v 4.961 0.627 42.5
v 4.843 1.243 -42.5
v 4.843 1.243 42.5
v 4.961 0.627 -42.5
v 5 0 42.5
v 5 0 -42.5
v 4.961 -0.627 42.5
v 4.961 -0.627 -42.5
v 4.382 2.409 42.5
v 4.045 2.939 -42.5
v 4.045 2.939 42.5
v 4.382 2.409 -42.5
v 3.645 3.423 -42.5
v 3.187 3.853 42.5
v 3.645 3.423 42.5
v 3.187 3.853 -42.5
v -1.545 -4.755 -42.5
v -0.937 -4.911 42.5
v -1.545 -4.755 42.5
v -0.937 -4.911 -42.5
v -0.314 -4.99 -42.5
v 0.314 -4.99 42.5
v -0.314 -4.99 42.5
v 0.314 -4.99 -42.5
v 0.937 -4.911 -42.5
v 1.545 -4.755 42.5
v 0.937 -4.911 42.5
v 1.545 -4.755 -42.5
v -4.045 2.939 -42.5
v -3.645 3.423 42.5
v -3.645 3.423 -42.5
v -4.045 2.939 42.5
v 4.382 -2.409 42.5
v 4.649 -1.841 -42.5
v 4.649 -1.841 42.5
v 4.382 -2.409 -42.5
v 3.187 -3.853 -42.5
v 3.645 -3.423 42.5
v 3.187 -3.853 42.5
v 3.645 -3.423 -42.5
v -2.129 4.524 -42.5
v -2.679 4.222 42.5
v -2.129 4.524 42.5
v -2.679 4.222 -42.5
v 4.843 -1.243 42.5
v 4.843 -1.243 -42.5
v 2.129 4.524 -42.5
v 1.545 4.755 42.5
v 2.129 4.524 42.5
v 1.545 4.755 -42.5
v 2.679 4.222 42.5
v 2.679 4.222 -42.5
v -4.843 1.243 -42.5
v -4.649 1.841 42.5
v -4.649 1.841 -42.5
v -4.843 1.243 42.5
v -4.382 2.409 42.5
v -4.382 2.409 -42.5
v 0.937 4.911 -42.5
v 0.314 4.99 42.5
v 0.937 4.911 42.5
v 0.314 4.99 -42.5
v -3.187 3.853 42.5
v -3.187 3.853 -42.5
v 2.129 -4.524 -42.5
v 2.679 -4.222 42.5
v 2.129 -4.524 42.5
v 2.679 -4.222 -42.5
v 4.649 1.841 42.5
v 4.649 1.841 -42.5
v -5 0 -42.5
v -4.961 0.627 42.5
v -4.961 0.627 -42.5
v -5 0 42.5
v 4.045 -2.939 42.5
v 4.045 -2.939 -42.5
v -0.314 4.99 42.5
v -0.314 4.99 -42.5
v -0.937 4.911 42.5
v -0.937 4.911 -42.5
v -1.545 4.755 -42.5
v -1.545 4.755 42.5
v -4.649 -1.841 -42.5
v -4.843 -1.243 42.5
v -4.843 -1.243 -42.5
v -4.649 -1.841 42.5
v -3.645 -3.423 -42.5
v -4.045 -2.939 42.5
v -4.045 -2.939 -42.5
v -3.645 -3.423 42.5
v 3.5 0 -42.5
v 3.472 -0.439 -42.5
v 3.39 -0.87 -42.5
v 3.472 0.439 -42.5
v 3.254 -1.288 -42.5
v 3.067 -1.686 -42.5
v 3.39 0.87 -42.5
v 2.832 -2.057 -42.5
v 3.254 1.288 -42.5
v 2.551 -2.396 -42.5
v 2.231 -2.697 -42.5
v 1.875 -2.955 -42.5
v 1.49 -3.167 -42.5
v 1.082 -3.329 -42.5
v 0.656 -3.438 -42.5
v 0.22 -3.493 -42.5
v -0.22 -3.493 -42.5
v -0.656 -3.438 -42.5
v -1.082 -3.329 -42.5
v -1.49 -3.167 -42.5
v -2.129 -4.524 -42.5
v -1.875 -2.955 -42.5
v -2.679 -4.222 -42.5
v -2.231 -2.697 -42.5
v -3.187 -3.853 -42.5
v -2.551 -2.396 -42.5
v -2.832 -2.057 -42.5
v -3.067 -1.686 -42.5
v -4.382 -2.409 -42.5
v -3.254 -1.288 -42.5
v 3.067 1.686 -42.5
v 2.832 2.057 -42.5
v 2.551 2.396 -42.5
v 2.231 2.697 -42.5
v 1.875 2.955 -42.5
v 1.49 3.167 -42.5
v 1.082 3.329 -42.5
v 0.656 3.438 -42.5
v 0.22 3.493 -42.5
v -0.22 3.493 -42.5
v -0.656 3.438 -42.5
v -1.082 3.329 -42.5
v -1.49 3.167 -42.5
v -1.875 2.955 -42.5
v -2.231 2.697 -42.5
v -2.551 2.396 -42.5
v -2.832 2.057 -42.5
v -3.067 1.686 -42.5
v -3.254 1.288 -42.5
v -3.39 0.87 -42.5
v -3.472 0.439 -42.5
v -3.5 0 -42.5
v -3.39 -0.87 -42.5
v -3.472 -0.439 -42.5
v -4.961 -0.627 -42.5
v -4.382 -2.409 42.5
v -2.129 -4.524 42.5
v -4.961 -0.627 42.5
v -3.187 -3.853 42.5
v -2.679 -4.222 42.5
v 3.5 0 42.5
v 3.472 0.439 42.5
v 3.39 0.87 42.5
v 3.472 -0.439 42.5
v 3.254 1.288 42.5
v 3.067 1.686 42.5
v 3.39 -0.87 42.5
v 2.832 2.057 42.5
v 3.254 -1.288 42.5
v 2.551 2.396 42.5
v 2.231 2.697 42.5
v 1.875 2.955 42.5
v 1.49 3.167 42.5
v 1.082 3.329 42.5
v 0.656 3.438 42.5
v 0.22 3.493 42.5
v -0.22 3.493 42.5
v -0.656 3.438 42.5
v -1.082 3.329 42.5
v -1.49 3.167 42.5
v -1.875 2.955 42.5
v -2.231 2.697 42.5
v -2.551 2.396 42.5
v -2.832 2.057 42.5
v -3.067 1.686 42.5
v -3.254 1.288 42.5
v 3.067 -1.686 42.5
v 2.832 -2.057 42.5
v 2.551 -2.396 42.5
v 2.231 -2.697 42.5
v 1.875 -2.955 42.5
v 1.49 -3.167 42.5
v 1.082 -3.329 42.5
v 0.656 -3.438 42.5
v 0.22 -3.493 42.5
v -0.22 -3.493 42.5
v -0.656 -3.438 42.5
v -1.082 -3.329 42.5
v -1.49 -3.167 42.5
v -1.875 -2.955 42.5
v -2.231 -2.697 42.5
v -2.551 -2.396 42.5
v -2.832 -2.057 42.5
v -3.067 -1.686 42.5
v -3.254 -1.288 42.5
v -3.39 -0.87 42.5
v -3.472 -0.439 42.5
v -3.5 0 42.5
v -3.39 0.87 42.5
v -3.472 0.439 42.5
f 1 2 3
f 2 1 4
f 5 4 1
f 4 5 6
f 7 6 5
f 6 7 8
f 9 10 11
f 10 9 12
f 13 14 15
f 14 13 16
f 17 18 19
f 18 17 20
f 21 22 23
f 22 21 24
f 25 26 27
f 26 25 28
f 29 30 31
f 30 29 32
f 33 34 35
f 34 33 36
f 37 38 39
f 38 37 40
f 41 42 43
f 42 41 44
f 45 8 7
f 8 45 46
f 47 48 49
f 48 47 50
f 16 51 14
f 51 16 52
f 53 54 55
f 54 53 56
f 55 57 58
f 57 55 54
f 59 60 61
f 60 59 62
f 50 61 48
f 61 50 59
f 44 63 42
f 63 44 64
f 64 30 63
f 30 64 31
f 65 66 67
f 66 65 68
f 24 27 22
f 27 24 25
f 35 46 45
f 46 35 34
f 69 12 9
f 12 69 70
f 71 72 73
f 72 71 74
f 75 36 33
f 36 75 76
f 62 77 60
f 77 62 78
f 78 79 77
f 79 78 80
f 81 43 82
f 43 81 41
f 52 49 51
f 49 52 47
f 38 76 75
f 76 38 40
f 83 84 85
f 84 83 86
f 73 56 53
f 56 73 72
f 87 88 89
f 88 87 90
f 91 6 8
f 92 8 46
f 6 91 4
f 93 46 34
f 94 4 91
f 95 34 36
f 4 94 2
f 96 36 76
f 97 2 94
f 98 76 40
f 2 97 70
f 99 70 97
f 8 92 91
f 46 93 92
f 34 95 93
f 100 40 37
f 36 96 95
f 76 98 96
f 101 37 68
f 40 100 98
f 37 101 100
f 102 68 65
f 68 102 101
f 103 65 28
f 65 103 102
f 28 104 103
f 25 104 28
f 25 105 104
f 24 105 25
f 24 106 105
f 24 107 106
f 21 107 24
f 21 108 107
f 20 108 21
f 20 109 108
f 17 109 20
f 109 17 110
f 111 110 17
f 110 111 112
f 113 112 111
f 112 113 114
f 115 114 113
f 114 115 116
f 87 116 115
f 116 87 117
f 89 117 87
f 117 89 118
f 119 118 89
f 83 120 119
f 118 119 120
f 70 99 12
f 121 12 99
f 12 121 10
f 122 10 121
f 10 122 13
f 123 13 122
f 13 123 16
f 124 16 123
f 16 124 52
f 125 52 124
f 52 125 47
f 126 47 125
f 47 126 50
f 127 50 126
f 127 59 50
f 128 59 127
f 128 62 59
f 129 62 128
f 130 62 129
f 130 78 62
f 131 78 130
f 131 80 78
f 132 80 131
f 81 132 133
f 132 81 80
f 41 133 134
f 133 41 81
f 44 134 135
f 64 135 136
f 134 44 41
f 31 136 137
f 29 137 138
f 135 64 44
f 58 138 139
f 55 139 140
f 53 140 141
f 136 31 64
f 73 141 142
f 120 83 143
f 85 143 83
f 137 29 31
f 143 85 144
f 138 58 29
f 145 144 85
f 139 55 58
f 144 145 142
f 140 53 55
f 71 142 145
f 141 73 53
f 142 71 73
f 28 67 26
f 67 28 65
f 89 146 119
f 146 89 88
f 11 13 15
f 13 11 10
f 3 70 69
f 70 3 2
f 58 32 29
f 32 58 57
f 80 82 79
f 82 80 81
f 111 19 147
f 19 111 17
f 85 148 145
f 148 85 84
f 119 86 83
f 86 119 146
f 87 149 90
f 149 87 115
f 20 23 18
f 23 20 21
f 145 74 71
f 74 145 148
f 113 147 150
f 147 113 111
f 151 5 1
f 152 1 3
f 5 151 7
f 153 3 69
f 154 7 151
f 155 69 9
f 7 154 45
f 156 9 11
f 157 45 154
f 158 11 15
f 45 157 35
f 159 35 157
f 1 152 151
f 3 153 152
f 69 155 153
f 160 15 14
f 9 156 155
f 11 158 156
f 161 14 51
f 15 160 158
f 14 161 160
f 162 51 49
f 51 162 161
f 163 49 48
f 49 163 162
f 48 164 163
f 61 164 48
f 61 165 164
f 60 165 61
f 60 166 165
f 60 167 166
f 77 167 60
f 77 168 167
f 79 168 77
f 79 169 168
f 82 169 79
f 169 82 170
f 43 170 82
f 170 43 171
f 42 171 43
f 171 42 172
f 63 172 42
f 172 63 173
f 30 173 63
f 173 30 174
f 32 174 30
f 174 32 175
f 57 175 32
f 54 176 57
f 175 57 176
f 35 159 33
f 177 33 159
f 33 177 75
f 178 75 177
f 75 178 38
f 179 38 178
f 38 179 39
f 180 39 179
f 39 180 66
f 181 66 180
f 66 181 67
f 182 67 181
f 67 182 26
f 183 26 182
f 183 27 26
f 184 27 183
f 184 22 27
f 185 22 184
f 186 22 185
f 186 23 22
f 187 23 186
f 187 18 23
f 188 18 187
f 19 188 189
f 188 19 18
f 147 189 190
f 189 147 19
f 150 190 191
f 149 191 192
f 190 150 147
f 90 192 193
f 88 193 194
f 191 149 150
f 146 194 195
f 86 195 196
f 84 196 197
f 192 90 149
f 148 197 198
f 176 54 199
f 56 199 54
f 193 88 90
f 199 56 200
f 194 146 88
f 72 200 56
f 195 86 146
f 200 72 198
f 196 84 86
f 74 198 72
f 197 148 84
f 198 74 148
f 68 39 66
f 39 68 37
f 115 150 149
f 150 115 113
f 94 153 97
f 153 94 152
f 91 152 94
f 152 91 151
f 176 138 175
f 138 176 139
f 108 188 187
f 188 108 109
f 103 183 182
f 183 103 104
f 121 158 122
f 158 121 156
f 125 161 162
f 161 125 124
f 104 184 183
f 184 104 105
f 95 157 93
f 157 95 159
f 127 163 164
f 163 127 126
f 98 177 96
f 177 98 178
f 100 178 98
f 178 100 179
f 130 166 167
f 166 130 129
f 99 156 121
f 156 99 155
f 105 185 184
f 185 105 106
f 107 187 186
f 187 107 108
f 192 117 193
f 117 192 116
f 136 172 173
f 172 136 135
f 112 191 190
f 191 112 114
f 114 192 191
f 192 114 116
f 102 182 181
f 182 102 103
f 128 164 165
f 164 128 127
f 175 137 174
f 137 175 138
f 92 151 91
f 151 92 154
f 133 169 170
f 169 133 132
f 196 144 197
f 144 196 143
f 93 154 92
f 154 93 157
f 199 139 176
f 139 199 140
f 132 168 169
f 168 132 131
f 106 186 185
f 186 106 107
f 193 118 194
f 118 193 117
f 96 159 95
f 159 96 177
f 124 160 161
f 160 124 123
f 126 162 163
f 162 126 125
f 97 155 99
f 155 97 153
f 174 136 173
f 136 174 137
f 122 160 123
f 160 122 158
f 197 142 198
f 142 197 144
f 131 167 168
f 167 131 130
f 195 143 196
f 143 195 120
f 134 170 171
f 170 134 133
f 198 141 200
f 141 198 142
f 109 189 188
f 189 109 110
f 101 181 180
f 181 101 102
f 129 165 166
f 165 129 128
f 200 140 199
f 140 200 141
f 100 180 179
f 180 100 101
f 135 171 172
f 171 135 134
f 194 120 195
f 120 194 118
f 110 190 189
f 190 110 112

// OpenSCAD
$fn = 50;


difference() {
	union() {
		translate(v = [0, 0, -42.5000000000]) {
			cylinder(h = 85, r = 5.0000000000);
		}
	}
	union() {
		translate(v = [0, 0, -100.0000000000]) {
			cylinder(h = 200, r = 3.5000000000);
		}
	}
}
